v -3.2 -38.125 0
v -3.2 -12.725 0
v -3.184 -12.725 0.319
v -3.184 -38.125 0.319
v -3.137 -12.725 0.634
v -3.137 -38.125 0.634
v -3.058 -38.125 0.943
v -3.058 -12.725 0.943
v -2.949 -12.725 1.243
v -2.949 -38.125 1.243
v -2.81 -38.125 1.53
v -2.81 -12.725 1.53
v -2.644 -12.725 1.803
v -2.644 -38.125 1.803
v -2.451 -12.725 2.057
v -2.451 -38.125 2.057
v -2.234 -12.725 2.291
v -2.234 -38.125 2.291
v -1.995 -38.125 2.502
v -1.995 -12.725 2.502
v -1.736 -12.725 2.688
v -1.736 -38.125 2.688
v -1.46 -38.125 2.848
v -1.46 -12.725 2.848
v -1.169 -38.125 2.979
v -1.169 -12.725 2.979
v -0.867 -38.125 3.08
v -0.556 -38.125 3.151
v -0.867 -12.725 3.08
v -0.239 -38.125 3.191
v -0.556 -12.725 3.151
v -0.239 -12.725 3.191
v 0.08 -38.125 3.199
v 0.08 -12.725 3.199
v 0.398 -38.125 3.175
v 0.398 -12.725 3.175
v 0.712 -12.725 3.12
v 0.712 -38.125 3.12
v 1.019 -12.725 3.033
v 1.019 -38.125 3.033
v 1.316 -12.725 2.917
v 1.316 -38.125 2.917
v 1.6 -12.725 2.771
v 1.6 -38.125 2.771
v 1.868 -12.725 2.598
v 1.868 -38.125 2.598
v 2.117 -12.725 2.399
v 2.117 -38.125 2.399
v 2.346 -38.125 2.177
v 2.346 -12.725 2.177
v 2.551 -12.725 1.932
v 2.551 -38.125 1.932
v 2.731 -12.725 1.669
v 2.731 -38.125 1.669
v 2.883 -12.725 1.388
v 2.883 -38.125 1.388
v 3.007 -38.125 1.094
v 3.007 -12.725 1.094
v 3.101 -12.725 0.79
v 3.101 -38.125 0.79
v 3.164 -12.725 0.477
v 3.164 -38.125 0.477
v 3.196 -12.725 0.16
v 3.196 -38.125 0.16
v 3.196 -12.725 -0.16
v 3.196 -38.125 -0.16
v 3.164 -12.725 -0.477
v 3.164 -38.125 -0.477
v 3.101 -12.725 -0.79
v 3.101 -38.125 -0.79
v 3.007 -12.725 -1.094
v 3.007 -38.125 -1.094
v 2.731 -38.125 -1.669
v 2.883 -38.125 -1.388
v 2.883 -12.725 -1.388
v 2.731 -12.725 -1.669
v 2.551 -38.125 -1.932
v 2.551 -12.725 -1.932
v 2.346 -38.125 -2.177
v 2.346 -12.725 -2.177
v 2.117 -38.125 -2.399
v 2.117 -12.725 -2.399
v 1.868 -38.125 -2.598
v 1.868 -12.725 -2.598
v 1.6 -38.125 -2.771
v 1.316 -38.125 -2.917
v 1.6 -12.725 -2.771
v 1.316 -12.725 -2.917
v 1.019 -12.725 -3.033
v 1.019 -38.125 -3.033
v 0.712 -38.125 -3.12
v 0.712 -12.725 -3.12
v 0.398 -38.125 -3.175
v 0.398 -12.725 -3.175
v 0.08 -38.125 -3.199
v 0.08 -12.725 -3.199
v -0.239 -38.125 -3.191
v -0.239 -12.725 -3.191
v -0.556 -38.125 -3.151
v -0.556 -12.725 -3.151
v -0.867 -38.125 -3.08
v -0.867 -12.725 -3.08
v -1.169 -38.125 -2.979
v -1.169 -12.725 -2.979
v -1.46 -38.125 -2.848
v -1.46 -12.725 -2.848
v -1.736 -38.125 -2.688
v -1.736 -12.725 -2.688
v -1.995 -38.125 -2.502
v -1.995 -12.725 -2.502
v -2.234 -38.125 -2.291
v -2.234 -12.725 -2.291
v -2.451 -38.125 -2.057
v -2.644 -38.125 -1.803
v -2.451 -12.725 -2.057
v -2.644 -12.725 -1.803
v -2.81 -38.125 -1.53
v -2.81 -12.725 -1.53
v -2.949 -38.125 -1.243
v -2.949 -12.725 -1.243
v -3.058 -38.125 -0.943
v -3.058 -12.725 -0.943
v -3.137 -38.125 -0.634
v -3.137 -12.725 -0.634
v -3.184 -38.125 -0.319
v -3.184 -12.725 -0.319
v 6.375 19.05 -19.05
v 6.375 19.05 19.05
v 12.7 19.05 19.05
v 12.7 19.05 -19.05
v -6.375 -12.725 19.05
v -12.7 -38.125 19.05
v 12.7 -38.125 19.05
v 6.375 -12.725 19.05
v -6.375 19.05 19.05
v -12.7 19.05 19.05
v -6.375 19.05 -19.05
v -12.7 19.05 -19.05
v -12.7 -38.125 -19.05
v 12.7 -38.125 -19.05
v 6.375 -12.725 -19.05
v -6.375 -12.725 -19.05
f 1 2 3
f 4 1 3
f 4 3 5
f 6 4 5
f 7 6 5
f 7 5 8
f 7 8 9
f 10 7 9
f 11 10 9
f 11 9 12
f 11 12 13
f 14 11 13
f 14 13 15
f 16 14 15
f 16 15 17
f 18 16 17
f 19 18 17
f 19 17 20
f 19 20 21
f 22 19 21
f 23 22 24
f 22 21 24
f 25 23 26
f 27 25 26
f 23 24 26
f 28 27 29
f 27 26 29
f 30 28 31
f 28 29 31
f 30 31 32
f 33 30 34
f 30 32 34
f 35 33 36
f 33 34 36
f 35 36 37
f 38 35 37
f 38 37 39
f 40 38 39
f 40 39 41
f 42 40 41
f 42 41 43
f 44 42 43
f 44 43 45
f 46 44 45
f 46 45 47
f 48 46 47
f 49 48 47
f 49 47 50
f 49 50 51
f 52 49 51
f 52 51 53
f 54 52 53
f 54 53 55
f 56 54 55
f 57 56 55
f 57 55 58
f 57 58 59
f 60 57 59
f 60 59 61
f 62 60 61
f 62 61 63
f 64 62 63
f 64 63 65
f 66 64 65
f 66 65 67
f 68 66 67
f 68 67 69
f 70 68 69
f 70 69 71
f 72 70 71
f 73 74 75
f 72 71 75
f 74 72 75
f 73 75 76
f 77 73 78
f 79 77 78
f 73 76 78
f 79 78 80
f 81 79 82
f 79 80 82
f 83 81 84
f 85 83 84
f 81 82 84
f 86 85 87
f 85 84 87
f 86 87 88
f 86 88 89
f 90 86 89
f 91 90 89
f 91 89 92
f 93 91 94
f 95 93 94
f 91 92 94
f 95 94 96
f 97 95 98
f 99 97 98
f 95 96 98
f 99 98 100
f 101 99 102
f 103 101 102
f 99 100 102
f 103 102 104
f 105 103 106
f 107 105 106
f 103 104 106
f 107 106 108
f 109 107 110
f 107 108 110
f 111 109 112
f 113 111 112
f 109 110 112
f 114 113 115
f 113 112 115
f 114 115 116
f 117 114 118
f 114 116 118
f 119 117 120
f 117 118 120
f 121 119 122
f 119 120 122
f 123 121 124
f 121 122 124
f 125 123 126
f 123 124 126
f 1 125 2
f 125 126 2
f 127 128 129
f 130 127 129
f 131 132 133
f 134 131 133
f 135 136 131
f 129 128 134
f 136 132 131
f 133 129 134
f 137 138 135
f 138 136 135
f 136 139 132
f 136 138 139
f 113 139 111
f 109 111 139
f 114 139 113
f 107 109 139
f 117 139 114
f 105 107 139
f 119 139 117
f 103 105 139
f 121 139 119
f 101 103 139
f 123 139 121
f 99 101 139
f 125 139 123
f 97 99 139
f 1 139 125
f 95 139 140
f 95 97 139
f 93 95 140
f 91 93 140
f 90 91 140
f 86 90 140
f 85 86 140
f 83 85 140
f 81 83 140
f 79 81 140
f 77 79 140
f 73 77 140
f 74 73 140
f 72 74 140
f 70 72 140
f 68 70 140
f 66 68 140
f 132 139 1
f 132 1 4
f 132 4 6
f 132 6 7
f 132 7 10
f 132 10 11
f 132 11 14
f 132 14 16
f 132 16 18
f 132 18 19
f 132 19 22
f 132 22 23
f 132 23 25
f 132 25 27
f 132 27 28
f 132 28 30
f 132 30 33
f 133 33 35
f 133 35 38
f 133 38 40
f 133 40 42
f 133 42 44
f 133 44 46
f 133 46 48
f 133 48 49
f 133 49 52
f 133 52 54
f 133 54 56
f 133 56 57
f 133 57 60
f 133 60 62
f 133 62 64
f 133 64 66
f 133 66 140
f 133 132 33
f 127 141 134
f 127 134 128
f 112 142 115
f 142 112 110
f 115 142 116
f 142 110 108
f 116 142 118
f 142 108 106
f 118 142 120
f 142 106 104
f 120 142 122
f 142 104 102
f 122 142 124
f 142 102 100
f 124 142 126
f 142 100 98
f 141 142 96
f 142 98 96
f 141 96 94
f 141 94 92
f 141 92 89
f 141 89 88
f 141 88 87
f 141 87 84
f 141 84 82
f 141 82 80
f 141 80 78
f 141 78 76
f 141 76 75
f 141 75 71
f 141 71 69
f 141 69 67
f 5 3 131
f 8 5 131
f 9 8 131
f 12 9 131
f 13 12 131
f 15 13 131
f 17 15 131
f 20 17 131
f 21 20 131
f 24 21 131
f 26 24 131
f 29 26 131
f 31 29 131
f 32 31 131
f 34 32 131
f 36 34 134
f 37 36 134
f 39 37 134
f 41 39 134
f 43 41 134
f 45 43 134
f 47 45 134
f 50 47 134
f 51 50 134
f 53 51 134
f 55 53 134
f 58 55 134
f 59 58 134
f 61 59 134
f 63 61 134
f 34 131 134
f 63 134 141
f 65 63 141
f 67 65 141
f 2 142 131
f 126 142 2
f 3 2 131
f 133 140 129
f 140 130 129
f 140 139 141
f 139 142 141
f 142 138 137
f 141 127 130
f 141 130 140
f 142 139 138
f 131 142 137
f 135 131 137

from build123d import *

# Parameters (mm, degrees)
F0_W      = 25.4
F0_H      = 38.1
F1_DEPTH  = 19.05
F2_T      = -6.325
F1_FACE_W = 25.4
F1_FACE_H = 38.1
F3_DEPTH  = 19.075
F5_D      = 6.4
F5_DEPTH  = 50


with BuildPart() as f1:
    # F0 (on Top) → F1 (new body, symmetric)
    with BuildSketch(Plane.XY):
        Rectangle(F0_W, F0_H)
    extrude(amount=F1_DEPTH, both=True)

    # F2
    f2_openings = [f1.faces().sort_by_distance(p)[0] for p in [
        (0, 19.05, 0),
        (0, 0, 19.05),
        (0, 0, -19.05),
    ]]
    offset(amount=F2_T, openings=f2_openings)

    # F1_face (on face) → F3 (join)
    with BuildSketch(Plane.XZ.offset(19.05)):
        Rectangle(F1_FACE_W, F1_FACE_H)
    extrude(amount=F3_DEPTH)

    # F5
    with Locations(Plane.XZ.offset(38.125)):
        with Locations((0, 0)):
            Hole(F5_D / 2, depth=F5_DEPTH)


solid = f1.part
